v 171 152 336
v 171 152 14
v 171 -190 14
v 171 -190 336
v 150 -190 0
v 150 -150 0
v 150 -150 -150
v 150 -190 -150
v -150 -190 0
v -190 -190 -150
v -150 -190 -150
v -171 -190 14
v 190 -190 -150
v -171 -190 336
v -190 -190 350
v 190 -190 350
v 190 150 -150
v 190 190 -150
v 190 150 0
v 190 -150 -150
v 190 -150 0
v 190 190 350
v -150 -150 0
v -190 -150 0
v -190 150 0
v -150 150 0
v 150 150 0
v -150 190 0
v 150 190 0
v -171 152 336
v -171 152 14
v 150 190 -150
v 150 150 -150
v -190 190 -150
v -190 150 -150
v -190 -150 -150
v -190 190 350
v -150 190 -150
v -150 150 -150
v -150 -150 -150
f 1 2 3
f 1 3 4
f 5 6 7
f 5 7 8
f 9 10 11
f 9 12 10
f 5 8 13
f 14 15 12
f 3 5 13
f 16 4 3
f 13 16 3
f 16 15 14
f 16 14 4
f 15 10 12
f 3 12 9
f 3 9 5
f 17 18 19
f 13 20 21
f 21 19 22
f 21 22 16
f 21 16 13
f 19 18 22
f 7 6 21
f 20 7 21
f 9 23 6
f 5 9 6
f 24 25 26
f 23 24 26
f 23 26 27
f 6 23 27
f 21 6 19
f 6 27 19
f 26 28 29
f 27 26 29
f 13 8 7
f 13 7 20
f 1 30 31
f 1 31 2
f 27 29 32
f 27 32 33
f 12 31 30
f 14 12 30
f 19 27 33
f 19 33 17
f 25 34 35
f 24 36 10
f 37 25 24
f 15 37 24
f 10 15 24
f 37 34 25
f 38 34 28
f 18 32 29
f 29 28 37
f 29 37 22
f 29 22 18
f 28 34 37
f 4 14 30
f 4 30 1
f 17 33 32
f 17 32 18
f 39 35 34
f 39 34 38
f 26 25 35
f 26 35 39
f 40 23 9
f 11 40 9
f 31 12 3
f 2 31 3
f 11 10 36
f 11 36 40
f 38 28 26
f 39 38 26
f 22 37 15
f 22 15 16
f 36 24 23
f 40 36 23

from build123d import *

# Parameters (mm, degrees)
F0_W      = 380
F0_H      = 380
F1_DEPTH  = 350
F2_W      = 342
F2_H      = 322
F3_DEPTH  = 342
F4_W      = 40
F4_H      = 40
F5_DEPTH  = 150
F6_W      = 40
F6_H      = 40
F7_DEPTH  = 150
F8_W      = 40
F8_H      = 40
F9_DEPTH  = 150
F10_W     = 40
F10_H     = 40
F11_DEPTH = 150


with BuildPart() as f1:
    # F0 (on Top) → F1 (new body)
    with BuildSketch(Plane.XY):
        Rectangle(F0_W, F0_H)
    extrude(amount=F1_DEPTH)

    # F2 (on face) → F3 (cut)
    with BuildSketch(Plane.XZ.offset(190)):
        with Locations((0, 175)):
            Rectangle(F2_W, F2_H)
    extrude(amount=-F3_DEPTH, mode=Mode.SUBTRACT)

    # F4 (on face) → F5 (join)
    with BuildSketch(Plane(origin=(0, 0, 0), x_dir=(1, 0, 0), z_dir=(0, 0, -1))):
        with Locations((-170, 170)):
            Rectangle(F4_W, F4_H)
    extrude(amount=F5_DEPTH)

    # F6 (on face) → F7 (join)
    with BuildSketch(Plane(origin=(0, 0, 0), x_dir=(1, 0, 0), z_dir=(0, 0, -1))):
        with Locations((170, 170)):
            Rectangle(F6_W, F6_H)
    extrude(amount=F7_DEPTH)

    # F8 (on face) → F9 (join)
    with BuildSketch(Plane(origin=(0, 0, 0), x_dir=(1, 0, 0), z_dir=(0, 0, -1))):
        with Locations((-170, -170)):
            Rectangle(F8_W, F8_H)
    extrude(amount=F9_DEPTH)

    # F10 (on face) → F11 (join)
    with BuildSketch(Plane(origin=(0, 0, 0), x_dir=(1, 0, 0), z_dir=(0, 0, -1))):
        with Locations((170, -170)):
            Rectangle(F10_W, F10_H)
    extrude(amount=F11_DEPTH)


solid = f1.part
